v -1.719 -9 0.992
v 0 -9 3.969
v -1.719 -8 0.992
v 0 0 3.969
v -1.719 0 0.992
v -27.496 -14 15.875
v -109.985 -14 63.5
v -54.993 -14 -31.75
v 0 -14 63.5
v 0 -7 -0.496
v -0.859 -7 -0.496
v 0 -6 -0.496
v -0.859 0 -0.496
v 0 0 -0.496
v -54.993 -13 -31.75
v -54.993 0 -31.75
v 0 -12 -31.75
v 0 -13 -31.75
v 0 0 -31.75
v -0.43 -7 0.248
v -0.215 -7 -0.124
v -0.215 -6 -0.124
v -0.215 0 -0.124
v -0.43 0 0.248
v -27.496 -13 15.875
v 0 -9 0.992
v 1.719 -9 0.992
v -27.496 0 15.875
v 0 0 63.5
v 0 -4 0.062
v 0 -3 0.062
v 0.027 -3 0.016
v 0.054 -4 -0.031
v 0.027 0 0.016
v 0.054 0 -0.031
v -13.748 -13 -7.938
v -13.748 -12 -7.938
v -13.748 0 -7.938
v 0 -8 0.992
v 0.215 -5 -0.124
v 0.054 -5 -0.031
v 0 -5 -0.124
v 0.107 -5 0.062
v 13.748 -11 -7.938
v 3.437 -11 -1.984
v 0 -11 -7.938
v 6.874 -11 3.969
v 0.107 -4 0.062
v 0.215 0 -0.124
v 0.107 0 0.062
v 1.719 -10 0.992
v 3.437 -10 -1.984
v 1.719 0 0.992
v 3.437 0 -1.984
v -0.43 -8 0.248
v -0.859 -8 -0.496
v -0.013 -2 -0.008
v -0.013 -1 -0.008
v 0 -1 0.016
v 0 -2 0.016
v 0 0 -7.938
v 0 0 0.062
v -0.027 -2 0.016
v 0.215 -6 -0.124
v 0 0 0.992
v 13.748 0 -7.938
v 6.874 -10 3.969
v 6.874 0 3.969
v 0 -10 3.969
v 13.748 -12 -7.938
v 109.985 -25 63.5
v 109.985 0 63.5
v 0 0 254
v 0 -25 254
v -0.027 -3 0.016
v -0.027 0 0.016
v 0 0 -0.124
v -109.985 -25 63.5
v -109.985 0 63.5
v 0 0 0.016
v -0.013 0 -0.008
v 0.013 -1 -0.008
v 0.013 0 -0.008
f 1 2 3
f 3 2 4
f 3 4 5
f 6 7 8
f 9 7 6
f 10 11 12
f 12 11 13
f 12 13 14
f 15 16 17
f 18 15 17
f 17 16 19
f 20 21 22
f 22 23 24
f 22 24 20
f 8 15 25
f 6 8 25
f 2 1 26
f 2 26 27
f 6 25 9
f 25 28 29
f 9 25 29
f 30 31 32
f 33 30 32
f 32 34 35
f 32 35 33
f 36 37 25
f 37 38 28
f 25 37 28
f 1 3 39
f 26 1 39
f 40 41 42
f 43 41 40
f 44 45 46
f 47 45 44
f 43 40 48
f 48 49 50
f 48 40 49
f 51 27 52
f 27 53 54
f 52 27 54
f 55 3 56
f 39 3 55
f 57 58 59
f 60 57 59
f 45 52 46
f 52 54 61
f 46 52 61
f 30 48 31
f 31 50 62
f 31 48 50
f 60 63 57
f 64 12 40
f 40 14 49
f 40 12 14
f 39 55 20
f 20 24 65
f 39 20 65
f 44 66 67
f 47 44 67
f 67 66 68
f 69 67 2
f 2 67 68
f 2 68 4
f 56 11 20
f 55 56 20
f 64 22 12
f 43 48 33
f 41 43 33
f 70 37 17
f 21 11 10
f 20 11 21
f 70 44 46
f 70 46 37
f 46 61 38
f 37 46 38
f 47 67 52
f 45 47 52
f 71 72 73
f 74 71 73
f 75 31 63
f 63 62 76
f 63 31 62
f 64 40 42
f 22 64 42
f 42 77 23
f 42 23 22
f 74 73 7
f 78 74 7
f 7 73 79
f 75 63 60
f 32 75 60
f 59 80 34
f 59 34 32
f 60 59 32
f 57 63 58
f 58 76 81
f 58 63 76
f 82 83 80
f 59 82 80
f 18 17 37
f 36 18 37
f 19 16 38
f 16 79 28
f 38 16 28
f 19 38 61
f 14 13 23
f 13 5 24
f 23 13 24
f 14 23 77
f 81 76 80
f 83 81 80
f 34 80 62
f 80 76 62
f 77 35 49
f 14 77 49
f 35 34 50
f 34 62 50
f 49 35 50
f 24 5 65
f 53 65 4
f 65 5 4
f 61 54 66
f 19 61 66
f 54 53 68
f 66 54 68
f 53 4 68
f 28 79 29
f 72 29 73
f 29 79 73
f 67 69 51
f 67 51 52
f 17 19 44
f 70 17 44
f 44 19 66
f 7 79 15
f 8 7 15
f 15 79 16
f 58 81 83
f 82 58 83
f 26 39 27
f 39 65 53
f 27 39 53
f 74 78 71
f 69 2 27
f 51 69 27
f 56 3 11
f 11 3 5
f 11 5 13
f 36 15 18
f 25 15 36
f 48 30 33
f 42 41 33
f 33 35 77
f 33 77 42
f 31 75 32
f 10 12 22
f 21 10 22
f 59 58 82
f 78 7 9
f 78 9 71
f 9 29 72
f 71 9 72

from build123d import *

# Parameters (mm, degrees)
F1_DEPTH  = 1
F2_DEPTH  = 2
F3_DEPTH  = 3
F4_DEPTH  = 4
F5_DEPTH  = 5
F6_DEPTH  = 6
F7_DEPTH  = 7
F8_DEPTH  = 8
F9_DEPTH  = 9
F10_DEPTH = 10
F11_DEPTH = 11
F12_DEPTH = 12
F13_DEPTH = 13
F14_DEPTH = 14
F15_DEPTH = 25


with BuildPart() as f1:
    # F0 (on Front) → F1 (new body)
    with BuildSketch(Plane.XZ):
        Polygon((-0.013426, -0.007751), (0.013426, -0.007751), (0, 0.015503), align=None)
    extrude(amount=F1_DEPTH)

    # F0 (on Front) → F2 (join)
    with BuildSketch(Plane.XZ):
        Polygon((0, 0.015503), (-0.026852, 0.015503), (-0.013426, -0.007751), align=None)
    extrude(amount=F2_DEPTH)

    # F0 (on Front) → F3 (join)
    with BuildSketch(Plane.XZ):
        Polygon((0.026852, 0.015503), (0, 0.062012), (-0.026852, 0.015503), (0, 0.015503), align=None)
    extrude(amount=F3_DEPTH)

    # F0 (on Front) → F4 (join)
    with BuildSketch(Plane.XZ):
        Polygon((0.053704, -0.031006), (0.107407, 0.062012), (0, 0.062012), (0.026852, 0.015503), align=None)
    extrude(amount=F4_DEPTH)

    # F0 (on Front) → F5 (join)
    with BuildSketch(Plane.XZ):
        Polygon((0, -0.124023), (0.214815, -0.124023), (0.107407, 0.062012), (0.053704, -0.031006), align=None)
    extrude(amount=F5_DEPTH)

    # F0 (on Front) → F6 (join)
    with BuildSketch(Plane.XZ):
        Polygon((-0.214815, -0.124023), (0, -0.496094), (0.214815, -0.124023), (0, -0.124023), align=None)
    extrude(amount=F6_DEPTH)

    # F0 (on Front) → F7 (join)
    with BuildSketch(Plane.XZ):
        Polygon((-0.42963, 0.248047), (-0.85926, -0.496094), (0, -0.496094), (-0.214815, -0.124023), align=None)
    extrude(amount=F7_DEPTH)

    # F0 (on Front) → F8 (join)
    with BuildSketch(Plane.XZ):
        Polygon((0, 0.992187), (-1.718519, 0.992187), (-0.85926, -0.496094), (-0.42963, 0.248047), align=None)
    extrude(amount=F8_DEPTH)

    # F0 (on Front) → F9 (join)
    with BuildSketch(Plane.XZ):
        Polygon((1.718519, 0.992188), (0, 3.96875), (-1.718519, 0.992187), (0, 0.992187), align=None)
    extrude(amount=F9_DEPTH)

    # F0 (on Front) → F10 (join)
    with BuildSketch(Plane.XZ):
        Polygon((3.437038, -1.984375), (6.874077, 3.96875), (0, 3.96875), (1.718519, 0.992188), align=None)
    extrude(amount=F10_DEPTH)

    # F0 (on Front) → F11 (join)
    with BuildSketch(Plane.XZ):
        Polygon((0, -7.9375), (13.748153, -7.9375), (6.874077, 3.96875), (3.437038, -1.984375), align=None)
    extrude(amount=F11_DEPTH)

    # F0 (on Front) → F12 (join)
    with BuildSketch(Plane.XZ):
        Polygon((-13.748153, -7.9375), (0, -31.75), (13.748153, -7.9375), (0, -7.9375), align=None)
    extrude(amount=F12_DEPTH)

    # F0 (on Front) → F13 (join)
    with BuildSketch(Plane.XZ):
        Polygon((-27.496307, 15.875), (-54.992613, -31.75), (0, -31.75), (-13.748153, -7.9375), align=None)
    extrude(amount=F13_DEPTH)

    # F0 (on Front) → F14 (join)
    with BuildSketch(Plane.XZ):
        Polygon((0, 63.5), (-109.985226, 63.5), (-54.992613, -31.75), (-27.496307, 15.875), align=None)
    extrude(amount=F14_DEPTH)

    # F0 (on Front) → F15 (join)
    with BuildSketch(Plane.XZ):
        Polygon((109.985226, 63.5), (0, 254), (-109.985226, 63.5), (0, 63.5), align=None)
    extrude(amount=F15_DEPTH)


solid = f1.part
